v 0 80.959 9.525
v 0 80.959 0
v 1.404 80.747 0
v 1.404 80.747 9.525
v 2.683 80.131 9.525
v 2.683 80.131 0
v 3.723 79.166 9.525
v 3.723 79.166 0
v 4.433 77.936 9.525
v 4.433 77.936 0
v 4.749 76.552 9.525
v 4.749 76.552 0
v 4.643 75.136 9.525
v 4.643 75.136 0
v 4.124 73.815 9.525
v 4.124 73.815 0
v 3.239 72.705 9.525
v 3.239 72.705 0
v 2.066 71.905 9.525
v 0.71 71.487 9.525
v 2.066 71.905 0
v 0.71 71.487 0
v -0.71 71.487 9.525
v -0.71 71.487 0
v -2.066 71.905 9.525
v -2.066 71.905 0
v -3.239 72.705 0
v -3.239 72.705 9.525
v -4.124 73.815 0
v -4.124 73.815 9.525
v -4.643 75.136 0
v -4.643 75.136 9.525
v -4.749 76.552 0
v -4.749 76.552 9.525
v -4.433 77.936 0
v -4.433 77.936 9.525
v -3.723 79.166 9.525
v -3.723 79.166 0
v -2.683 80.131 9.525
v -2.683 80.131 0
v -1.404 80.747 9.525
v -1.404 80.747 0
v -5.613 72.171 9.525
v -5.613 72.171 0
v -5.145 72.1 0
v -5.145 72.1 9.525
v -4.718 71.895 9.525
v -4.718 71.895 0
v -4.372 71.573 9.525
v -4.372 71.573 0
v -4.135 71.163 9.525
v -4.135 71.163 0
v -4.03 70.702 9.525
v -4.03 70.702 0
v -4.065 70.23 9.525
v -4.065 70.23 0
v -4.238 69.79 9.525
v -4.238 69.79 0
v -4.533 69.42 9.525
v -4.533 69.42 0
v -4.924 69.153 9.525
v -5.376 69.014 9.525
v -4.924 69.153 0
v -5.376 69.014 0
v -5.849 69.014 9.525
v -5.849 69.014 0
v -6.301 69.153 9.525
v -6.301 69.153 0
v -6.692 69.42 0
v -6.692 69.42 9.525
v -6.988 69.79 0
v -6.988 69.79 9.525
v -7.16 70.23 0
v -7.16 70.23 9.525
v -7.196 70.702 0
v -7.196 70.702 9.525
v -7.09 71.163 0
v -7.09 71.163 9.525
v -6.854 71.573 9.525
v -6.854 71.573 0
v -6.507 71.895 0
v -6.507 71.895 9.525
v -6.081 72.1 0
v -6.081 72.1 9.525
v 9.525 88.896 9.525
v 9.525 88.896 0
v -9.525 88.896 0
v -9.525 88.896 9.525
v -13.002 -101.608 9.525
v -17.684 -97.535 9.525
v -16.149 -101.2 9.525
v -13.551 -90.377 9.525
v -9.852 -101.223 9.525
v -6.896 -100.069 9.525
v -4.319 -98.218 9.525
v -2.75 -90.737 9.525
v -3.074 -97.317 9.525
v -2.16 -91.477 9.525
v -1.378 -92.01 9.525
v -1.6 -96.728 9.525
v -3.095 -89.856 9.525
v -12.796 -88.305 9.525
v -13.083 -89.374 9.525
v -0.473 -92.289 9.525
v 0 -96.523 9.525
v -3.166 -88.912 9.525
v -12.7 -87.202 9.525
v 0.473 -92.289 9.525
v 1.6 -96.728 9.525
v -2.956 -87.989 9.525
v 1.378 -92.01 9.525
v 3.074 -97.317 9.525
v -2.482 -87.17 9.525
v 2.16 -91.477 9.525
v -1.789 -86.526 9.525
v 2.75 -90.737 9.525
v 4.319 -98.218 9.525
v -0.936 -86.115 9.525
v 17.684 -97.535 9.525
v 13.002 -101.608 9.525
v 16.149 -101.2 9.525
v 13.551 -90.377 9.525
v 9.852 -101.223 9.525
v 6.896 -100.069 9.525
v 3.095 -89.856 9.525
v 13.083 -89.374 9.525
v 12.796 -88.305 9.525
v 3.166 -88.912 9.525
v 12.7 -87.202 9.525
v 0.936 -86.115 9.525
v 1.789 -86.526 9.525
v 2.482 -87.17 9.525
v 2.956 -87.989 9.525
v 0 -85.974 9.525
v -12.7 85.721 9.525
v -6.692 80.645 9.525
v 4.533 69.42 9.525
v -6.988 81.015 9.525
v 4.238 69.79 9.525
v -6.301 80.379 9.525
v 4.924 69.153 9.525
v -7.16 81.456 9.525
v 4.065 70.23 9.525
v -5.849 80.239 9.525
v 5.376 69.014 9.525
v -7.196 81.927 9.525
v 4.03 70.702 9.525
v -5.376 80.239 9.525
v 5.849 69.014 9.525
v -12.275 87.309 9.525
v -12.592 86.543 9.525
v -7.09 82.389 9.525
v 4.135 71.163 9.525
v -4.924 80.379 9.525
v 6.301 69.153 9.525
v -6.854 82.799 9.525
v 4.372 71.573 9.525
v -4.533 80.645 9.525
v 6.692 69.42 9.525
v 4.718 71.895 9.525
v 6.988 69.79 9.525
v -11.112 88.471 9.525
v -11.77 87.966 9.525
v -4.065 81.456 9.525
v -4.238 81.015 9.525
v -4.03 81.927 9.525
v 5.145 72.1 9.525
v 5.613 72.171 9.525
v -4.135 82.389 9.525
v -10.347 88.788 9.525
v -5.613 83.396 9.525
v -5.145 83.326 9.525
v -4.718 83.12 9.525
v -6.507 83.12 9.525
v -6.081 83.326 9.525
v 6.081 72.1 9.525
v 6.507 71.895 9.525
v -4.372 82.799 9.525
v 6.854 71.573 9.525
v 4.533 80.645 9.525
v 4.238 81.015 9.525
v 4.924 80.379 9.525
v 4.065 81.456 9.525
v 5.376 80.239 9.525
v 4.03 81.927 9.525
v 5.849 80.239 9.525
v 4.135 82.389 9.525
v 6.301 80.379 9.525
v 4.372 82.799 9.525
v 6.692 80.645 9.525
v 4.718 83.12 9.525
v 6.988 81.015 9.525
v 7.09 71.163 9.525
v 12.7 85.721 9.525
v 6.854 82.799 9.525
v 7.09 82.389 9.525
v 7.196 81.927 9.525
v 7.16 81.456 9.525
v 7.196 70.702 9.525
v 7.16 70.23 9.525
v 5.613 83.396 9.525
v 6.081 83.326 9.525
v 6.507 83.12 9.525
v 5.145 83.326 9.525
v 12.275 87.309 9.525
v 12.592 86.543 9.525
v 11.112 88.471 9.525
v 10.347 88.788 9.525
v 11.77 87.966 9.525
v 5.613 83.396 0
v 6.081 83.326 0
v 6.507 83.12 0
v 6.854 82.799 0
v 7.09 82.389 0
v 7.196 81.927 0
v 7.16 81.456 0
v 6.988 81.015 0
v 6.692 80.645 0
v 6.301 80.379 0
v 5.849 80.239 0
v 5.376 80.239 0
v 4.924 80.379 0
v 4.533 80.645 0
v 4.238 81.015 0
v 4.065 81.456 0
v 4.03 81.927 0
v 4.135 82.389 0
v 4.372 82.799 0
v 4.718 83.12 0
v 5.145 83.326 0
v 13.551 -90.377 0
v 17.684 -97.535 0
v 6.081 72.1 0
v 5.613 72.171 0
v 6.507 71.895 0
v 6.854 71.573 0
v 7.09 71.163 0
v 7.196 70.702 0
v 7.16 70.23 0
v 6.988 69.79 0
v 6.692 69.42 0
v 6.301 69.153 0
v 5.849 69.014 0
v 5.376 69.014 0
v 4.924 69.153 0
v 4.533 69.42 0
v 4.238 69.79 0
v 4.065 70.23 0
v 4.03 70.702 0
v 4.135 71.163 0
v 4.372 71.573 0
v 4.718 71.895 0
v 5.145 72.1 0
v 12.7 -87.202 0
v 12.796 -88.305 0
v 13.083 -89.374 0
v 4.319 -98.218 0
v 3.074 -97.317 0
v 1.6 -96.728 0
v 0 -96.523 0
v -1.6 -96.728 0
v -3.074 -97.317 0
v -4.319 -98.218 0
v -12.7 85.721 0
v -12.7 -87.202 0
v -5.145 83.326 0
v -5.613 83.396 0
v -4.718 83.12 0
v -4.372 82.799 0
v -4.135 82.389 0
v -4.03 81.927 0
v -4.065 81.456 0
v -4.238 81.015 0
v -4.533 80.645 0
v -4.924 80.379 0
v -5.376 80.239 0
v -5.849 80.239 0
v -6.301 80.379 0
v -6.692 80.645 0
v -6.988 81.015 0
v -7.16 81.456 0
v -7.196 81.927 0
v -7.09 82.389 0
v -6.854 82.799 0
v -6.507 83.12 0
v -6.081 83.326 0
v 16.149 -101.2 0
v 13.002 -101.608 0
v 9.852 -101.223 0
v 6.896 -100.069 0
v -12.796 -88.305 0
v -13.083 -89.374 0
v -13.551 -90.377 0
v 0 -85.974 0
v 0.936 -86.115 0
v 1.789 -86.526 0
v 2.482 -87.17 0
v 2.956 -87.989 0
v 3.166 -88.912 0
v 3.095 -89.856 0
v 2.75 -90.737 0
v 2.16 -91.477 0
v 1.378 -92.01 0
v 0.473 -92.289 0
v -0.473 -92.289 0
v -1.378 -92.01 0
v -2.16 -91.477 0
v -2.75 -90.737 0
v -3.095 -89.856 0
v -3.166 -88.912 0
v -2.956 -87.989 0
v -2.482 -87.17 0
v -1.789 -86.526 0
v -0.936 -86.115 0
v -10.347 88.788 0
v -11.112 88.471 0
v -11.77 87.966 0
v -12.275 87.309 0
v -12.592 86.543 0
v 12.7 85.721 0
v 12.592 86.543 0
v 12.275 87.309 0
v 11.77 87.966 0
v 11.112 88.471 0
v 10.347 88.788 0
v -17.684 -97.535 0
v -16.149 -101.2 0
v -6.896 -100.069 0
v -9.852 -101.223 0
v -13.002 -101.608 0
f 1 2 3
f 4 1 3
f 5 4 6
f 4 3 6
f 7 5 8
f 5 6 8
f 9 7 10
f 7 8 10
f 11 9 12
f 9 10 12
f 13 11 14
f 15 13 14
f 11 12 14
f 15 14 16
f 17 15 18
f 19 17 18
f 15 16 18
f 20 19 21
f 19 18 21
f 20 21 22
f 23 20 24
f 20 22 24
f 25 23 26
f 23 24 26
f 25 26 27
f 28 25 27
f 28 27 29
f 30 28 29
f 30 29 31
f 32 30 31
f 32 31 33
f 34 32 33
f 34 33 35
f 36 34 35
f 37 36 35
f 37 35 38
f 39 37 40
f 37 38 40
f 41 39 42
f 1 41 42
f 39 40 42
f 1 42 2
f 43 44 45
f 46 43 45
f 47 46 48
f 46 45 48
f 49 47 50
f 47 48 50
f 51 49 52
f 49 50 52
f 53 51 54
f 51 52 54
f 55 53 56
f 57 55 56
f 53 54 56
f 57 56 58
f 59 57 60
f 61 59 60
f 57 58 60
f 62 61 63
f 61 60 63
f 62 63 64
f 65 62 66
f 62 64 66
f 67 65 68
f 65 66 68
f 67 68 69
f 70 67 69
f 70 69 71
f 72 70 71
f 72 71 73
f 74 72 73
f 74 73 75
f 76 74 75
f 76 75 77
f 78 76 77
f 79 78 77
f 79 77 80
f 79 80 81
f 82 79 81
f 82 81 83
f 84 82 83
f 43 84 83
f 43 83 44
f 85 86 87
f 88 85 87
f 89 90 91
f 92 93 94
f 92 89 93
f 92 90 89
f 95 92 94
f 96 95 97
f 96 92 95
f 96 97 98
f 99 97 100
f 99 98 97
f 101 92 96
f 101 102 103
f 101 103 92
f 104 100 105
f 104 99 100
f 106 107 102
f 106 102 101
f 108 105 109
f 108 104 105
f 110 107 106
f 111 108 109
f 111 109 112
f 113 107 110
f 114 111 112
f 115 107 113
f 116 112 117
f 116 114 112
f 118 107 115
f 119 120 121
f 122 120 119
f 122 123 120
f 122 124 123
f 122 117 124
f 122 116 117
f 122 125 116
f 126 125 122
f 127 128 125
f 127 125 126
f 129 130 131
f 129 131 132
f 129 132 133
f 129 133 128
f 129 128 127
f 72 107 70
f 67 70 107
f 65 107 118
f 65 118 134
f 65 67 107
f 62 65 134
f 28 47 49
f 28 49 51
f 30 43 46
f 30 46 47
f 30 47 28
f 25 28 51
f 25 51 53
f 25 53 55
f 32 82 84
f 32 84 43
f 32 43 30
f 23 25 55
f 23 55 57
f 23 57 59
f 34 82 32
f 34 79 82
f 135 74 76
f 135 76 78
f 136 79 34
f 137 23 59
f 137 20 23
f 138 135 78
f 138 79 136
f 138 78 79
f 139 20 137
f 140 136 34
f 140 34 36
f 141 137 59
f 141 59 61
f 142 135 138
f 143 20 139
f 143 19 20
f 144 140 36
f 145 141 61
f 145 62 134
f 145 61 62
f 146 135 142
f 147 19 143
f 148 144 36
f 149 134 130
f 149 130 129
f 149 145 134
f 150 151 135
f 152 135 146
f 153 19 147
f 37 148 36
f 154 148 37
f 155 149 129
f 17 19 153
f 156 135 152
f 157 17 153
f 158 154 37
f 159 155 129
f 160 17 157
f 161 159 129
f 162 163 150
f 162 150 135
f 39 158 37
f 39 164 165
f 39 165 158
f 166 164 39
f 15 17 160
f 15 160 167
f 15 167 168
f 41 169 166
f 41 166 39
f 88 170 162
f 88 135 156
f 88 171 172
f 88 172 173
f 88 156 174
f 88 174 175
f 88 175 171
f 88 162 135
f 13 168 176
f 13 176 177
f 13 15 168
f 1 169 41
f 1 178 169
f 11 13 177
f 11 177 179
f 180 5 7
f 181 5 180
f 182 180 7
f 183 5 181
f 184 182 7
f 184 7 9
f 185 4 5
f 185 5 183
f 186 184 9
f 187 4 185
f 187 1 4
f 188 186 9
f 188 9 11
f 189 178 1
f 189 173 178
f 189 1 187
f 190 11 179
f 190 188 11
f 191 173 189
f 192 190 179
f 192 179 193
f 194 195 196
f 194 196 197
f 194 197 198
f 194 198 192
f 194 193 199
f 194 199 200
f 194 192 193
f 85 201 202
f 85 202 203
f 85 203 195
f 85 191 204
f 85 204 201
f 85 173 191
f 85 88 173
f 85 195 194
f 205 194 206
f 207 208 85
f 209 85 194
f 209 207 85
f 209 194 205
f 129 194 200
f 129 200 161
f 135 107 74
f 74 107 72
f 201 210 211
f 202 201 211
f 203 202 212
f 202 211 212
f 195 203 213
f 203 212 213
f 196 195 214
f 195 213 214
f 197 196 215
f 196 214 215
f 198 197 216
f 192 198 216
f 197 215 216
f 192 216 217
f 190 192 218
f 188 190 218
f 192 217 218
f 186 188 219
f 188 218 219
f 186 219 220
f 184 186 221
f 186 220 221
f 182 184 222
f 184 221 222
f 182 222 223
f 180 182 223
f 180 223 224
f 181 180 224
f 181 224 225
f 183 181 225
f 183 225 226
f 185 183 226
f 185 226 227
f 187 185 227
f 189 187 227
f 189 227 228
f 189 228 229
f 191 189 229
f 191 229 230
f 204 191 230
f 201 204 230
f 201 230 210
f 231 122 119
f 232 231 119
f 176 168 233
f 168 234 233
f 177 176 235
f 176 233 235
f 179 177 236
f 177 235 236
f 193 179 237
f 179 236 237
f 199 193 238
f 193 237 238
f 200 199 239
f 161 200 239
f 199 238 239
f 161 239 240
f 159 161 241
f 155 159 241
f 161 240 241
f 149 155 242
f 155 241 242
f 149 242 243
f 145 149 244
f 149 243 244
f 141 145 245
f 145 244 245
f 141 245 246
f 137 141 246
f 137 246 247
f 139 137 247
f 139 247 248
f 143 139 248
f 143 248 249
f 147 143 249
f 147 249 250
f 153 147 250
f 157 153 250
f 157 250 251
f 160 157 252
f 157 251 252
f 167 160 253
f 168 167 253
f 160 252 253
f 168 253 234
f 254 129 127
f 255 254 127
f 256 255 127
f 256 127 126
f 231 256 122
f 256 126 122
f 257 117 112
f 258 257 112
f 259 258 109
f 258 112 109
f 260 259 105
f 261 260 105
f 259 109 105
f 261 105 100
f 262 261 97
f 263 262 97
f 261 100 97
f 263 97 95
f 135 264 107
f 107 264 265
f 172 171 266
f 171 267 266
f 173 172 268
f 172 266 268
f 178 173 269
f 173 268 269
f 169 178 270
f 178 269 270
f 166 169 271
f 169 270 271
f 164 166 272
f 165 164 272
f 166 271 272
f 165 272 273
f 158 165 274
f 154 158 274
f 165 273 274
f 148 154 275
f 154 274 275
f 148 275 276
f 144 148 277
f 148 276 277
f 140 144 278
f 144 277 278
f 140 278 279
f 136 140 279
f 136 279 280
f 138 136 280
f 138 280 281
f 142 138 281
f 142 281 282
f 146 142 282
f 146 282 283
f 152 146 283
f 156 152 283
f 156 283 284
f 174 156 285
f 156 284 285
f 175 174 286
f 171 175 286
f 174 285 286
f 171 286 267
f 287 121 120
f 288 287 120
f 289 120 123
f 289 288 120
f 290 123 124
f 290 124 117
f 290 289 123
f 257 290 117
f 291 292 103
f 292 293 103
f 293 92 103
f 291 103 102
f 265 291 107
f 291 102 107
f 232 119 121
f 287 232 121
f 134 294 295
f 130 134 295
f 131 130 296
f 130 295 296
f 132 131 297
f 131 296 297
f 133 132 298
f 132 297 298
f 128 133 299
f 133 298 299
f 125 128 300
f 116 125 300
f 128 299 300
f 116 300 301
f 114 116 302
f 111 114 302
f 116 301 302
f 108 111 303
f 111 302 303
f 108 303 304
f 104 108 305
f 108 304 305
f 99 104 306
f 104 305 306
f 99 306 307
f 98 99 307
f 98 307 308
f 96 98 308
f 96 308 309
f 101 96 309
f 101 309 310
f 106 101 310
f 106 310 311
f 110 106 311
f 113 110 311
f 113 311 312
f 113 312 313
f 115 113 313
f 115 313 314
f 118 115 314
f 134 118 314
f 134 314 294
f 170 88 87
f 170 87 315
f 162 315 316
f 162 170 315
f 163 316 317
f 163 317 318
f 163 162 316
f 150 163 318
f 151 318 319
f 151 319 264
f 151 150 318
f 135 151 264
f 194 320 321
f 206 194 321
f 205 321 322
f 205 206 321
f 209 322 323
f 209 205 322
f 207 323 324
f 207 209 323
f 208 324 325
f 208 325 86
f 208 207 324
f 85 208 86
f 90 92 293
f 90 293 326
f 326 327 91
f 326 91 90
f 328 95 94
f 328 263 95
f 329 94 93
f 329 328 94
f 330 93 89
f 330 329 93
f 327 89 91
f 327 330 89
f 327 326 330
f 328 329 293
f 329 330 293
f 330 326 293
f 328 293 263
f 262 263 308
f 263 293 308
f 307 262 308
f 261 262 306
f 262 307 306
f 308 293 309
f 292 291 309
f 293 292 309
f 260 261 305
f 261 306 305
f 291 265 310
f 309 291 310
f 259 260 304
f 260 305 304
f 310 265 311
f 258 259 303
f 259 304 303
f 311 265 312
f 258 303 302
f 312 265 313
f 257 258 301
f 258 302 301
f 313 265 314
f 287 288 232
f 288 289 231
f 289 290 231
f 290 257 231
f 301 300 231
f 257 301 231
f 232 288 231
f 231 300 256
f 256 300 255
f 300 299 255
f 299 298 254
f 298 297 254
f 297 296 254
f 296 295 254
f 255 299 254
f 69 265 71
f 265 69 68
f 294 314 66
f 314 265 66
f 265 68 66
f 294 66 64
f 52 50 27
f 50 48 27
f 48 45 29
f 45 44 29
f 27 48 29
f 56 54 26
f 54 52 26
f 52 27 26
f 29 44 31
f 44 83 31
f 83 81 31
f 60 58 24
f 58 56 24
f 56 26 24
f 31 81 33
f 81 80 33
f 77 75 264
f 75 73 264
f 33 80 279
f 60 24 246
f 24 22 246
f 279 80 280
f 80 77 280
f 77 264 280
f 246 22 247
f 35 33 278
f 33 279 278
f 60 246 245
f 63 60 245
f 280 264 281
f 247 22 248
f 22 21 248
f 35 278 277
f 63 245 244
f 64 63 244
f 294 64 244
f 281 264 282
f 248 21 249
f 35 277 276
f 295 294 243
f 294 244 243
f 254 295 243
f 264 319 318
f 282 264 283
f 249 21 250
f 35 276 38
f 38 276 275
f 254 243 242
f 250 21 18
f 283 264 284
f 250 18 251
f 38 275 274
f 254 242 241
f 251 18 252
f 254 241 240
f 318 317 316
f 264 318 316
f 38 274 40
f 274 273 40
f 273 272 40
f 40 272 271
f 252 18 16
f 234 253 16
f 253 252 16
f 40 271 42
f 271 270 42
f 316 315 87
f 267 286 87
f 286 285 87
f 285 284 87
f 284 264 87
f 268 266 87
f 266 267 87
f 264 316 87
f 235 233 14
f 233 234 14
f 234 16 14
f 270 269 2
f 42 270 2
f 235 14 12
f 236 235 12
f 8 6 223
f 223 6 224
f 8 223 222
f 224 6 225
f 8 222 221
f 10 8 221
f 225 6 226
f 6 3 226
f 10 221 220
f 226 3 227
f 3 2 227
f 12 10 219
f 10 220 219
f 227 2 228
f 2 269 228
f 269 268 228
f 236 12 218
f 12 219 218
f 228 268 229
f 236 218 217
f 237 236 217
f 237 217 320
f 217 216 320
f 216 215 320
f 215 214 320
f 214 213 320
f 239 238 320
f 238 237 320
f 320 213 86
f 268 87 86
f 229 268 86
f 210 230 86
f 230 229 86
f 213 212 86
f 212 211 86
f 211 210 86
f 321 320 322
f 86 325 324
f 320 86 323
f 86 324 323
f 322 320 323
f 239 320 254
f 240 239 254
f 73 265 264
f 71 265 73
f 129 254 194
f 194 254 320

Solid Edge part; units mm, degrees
sketch "Sketch1" plane through (0, 0, 0) normal (0, 0, 1) x (1, 0, 0)
  line L0 (12.7, -88.9038) -> (12.7, 88.8962)
  line L1 (12.7, 88.8962) -> (-12.7, 88.8962)
  line L2 (-12.7, 88.8962) -> (-12.7, -88.9038)
  line L3 (-12.7, -88.9038) -> (-19.1158, -100.0163)
  line L4 (-19.1158, -100.0163) -> (-10.8669, -104.7788)
  line L5 (-10.8669, -104.7788) -> (0, -93.9119)
  line L6 (10.8669, -104.7788) -> (0, -93.9119)
  line L7 (19.1158, -100.0163) -> (10.8669, -104.7788)
  line L8 (12.7, -88.9038) -> (19.1158, -100.0163)
  dimension "D1" = 177.8
  dimension "D2" = 25.4
  dimension "D3" = 9.525
  dimension "D4" = 15.875
extrude "Protrusion1" add sketch "Sketch1" along normal blind 9.525
hole "Hole_1" at (0, 76.1962, 0) direction (0, 0, 1) diameter 9.525 end up to next
fillet "Round_1" radius 3.175 2 edges at (12.7, 88.8962, 4.7625) (-12.7, 88.8962, 4.7625)
hole "Hole_2" at (-5.6127, 70.5835, 0) direction (0, 0, 1) diameter 3.175 end up to next
hole "Hole1" at (5.6127, 70.5835, 0) direction (0, 0, 1) diameter 3.175 end up to next
hole "Hole2" at (5.6127, 81.8088, 0) direction (0, 0, 1) diameter 3.175 end up to next
hole "Hole3" at (-5.6127, 81.8088, 0) direction (0, 0, 1) diameter 3.175 end up to next
fillet "Round_2" radius 12.7 2 edges at (10.8669, -104.7788, 4.7625) (-10.8669, -104.7788, 4.7625)
hole "Hole_6" at (0, -89.1494, 0) direction (0, 0, 1) diameter 6.35 end up to next
fillet "Round_3" radius 6.35 3 edges at (0, -93.9119, 4.7625) (12.7, -88.9038, 4.7625) (-12.7, -88.9038, 4.7625)
chamfer "Chamfer_1" distance 2.54 angle 45 2 edges at (-19.1158, -100.0163, 4.7625) (19.1158, -100.0163, 4.7625)
properties part number "SPaRC 02 - 004"
